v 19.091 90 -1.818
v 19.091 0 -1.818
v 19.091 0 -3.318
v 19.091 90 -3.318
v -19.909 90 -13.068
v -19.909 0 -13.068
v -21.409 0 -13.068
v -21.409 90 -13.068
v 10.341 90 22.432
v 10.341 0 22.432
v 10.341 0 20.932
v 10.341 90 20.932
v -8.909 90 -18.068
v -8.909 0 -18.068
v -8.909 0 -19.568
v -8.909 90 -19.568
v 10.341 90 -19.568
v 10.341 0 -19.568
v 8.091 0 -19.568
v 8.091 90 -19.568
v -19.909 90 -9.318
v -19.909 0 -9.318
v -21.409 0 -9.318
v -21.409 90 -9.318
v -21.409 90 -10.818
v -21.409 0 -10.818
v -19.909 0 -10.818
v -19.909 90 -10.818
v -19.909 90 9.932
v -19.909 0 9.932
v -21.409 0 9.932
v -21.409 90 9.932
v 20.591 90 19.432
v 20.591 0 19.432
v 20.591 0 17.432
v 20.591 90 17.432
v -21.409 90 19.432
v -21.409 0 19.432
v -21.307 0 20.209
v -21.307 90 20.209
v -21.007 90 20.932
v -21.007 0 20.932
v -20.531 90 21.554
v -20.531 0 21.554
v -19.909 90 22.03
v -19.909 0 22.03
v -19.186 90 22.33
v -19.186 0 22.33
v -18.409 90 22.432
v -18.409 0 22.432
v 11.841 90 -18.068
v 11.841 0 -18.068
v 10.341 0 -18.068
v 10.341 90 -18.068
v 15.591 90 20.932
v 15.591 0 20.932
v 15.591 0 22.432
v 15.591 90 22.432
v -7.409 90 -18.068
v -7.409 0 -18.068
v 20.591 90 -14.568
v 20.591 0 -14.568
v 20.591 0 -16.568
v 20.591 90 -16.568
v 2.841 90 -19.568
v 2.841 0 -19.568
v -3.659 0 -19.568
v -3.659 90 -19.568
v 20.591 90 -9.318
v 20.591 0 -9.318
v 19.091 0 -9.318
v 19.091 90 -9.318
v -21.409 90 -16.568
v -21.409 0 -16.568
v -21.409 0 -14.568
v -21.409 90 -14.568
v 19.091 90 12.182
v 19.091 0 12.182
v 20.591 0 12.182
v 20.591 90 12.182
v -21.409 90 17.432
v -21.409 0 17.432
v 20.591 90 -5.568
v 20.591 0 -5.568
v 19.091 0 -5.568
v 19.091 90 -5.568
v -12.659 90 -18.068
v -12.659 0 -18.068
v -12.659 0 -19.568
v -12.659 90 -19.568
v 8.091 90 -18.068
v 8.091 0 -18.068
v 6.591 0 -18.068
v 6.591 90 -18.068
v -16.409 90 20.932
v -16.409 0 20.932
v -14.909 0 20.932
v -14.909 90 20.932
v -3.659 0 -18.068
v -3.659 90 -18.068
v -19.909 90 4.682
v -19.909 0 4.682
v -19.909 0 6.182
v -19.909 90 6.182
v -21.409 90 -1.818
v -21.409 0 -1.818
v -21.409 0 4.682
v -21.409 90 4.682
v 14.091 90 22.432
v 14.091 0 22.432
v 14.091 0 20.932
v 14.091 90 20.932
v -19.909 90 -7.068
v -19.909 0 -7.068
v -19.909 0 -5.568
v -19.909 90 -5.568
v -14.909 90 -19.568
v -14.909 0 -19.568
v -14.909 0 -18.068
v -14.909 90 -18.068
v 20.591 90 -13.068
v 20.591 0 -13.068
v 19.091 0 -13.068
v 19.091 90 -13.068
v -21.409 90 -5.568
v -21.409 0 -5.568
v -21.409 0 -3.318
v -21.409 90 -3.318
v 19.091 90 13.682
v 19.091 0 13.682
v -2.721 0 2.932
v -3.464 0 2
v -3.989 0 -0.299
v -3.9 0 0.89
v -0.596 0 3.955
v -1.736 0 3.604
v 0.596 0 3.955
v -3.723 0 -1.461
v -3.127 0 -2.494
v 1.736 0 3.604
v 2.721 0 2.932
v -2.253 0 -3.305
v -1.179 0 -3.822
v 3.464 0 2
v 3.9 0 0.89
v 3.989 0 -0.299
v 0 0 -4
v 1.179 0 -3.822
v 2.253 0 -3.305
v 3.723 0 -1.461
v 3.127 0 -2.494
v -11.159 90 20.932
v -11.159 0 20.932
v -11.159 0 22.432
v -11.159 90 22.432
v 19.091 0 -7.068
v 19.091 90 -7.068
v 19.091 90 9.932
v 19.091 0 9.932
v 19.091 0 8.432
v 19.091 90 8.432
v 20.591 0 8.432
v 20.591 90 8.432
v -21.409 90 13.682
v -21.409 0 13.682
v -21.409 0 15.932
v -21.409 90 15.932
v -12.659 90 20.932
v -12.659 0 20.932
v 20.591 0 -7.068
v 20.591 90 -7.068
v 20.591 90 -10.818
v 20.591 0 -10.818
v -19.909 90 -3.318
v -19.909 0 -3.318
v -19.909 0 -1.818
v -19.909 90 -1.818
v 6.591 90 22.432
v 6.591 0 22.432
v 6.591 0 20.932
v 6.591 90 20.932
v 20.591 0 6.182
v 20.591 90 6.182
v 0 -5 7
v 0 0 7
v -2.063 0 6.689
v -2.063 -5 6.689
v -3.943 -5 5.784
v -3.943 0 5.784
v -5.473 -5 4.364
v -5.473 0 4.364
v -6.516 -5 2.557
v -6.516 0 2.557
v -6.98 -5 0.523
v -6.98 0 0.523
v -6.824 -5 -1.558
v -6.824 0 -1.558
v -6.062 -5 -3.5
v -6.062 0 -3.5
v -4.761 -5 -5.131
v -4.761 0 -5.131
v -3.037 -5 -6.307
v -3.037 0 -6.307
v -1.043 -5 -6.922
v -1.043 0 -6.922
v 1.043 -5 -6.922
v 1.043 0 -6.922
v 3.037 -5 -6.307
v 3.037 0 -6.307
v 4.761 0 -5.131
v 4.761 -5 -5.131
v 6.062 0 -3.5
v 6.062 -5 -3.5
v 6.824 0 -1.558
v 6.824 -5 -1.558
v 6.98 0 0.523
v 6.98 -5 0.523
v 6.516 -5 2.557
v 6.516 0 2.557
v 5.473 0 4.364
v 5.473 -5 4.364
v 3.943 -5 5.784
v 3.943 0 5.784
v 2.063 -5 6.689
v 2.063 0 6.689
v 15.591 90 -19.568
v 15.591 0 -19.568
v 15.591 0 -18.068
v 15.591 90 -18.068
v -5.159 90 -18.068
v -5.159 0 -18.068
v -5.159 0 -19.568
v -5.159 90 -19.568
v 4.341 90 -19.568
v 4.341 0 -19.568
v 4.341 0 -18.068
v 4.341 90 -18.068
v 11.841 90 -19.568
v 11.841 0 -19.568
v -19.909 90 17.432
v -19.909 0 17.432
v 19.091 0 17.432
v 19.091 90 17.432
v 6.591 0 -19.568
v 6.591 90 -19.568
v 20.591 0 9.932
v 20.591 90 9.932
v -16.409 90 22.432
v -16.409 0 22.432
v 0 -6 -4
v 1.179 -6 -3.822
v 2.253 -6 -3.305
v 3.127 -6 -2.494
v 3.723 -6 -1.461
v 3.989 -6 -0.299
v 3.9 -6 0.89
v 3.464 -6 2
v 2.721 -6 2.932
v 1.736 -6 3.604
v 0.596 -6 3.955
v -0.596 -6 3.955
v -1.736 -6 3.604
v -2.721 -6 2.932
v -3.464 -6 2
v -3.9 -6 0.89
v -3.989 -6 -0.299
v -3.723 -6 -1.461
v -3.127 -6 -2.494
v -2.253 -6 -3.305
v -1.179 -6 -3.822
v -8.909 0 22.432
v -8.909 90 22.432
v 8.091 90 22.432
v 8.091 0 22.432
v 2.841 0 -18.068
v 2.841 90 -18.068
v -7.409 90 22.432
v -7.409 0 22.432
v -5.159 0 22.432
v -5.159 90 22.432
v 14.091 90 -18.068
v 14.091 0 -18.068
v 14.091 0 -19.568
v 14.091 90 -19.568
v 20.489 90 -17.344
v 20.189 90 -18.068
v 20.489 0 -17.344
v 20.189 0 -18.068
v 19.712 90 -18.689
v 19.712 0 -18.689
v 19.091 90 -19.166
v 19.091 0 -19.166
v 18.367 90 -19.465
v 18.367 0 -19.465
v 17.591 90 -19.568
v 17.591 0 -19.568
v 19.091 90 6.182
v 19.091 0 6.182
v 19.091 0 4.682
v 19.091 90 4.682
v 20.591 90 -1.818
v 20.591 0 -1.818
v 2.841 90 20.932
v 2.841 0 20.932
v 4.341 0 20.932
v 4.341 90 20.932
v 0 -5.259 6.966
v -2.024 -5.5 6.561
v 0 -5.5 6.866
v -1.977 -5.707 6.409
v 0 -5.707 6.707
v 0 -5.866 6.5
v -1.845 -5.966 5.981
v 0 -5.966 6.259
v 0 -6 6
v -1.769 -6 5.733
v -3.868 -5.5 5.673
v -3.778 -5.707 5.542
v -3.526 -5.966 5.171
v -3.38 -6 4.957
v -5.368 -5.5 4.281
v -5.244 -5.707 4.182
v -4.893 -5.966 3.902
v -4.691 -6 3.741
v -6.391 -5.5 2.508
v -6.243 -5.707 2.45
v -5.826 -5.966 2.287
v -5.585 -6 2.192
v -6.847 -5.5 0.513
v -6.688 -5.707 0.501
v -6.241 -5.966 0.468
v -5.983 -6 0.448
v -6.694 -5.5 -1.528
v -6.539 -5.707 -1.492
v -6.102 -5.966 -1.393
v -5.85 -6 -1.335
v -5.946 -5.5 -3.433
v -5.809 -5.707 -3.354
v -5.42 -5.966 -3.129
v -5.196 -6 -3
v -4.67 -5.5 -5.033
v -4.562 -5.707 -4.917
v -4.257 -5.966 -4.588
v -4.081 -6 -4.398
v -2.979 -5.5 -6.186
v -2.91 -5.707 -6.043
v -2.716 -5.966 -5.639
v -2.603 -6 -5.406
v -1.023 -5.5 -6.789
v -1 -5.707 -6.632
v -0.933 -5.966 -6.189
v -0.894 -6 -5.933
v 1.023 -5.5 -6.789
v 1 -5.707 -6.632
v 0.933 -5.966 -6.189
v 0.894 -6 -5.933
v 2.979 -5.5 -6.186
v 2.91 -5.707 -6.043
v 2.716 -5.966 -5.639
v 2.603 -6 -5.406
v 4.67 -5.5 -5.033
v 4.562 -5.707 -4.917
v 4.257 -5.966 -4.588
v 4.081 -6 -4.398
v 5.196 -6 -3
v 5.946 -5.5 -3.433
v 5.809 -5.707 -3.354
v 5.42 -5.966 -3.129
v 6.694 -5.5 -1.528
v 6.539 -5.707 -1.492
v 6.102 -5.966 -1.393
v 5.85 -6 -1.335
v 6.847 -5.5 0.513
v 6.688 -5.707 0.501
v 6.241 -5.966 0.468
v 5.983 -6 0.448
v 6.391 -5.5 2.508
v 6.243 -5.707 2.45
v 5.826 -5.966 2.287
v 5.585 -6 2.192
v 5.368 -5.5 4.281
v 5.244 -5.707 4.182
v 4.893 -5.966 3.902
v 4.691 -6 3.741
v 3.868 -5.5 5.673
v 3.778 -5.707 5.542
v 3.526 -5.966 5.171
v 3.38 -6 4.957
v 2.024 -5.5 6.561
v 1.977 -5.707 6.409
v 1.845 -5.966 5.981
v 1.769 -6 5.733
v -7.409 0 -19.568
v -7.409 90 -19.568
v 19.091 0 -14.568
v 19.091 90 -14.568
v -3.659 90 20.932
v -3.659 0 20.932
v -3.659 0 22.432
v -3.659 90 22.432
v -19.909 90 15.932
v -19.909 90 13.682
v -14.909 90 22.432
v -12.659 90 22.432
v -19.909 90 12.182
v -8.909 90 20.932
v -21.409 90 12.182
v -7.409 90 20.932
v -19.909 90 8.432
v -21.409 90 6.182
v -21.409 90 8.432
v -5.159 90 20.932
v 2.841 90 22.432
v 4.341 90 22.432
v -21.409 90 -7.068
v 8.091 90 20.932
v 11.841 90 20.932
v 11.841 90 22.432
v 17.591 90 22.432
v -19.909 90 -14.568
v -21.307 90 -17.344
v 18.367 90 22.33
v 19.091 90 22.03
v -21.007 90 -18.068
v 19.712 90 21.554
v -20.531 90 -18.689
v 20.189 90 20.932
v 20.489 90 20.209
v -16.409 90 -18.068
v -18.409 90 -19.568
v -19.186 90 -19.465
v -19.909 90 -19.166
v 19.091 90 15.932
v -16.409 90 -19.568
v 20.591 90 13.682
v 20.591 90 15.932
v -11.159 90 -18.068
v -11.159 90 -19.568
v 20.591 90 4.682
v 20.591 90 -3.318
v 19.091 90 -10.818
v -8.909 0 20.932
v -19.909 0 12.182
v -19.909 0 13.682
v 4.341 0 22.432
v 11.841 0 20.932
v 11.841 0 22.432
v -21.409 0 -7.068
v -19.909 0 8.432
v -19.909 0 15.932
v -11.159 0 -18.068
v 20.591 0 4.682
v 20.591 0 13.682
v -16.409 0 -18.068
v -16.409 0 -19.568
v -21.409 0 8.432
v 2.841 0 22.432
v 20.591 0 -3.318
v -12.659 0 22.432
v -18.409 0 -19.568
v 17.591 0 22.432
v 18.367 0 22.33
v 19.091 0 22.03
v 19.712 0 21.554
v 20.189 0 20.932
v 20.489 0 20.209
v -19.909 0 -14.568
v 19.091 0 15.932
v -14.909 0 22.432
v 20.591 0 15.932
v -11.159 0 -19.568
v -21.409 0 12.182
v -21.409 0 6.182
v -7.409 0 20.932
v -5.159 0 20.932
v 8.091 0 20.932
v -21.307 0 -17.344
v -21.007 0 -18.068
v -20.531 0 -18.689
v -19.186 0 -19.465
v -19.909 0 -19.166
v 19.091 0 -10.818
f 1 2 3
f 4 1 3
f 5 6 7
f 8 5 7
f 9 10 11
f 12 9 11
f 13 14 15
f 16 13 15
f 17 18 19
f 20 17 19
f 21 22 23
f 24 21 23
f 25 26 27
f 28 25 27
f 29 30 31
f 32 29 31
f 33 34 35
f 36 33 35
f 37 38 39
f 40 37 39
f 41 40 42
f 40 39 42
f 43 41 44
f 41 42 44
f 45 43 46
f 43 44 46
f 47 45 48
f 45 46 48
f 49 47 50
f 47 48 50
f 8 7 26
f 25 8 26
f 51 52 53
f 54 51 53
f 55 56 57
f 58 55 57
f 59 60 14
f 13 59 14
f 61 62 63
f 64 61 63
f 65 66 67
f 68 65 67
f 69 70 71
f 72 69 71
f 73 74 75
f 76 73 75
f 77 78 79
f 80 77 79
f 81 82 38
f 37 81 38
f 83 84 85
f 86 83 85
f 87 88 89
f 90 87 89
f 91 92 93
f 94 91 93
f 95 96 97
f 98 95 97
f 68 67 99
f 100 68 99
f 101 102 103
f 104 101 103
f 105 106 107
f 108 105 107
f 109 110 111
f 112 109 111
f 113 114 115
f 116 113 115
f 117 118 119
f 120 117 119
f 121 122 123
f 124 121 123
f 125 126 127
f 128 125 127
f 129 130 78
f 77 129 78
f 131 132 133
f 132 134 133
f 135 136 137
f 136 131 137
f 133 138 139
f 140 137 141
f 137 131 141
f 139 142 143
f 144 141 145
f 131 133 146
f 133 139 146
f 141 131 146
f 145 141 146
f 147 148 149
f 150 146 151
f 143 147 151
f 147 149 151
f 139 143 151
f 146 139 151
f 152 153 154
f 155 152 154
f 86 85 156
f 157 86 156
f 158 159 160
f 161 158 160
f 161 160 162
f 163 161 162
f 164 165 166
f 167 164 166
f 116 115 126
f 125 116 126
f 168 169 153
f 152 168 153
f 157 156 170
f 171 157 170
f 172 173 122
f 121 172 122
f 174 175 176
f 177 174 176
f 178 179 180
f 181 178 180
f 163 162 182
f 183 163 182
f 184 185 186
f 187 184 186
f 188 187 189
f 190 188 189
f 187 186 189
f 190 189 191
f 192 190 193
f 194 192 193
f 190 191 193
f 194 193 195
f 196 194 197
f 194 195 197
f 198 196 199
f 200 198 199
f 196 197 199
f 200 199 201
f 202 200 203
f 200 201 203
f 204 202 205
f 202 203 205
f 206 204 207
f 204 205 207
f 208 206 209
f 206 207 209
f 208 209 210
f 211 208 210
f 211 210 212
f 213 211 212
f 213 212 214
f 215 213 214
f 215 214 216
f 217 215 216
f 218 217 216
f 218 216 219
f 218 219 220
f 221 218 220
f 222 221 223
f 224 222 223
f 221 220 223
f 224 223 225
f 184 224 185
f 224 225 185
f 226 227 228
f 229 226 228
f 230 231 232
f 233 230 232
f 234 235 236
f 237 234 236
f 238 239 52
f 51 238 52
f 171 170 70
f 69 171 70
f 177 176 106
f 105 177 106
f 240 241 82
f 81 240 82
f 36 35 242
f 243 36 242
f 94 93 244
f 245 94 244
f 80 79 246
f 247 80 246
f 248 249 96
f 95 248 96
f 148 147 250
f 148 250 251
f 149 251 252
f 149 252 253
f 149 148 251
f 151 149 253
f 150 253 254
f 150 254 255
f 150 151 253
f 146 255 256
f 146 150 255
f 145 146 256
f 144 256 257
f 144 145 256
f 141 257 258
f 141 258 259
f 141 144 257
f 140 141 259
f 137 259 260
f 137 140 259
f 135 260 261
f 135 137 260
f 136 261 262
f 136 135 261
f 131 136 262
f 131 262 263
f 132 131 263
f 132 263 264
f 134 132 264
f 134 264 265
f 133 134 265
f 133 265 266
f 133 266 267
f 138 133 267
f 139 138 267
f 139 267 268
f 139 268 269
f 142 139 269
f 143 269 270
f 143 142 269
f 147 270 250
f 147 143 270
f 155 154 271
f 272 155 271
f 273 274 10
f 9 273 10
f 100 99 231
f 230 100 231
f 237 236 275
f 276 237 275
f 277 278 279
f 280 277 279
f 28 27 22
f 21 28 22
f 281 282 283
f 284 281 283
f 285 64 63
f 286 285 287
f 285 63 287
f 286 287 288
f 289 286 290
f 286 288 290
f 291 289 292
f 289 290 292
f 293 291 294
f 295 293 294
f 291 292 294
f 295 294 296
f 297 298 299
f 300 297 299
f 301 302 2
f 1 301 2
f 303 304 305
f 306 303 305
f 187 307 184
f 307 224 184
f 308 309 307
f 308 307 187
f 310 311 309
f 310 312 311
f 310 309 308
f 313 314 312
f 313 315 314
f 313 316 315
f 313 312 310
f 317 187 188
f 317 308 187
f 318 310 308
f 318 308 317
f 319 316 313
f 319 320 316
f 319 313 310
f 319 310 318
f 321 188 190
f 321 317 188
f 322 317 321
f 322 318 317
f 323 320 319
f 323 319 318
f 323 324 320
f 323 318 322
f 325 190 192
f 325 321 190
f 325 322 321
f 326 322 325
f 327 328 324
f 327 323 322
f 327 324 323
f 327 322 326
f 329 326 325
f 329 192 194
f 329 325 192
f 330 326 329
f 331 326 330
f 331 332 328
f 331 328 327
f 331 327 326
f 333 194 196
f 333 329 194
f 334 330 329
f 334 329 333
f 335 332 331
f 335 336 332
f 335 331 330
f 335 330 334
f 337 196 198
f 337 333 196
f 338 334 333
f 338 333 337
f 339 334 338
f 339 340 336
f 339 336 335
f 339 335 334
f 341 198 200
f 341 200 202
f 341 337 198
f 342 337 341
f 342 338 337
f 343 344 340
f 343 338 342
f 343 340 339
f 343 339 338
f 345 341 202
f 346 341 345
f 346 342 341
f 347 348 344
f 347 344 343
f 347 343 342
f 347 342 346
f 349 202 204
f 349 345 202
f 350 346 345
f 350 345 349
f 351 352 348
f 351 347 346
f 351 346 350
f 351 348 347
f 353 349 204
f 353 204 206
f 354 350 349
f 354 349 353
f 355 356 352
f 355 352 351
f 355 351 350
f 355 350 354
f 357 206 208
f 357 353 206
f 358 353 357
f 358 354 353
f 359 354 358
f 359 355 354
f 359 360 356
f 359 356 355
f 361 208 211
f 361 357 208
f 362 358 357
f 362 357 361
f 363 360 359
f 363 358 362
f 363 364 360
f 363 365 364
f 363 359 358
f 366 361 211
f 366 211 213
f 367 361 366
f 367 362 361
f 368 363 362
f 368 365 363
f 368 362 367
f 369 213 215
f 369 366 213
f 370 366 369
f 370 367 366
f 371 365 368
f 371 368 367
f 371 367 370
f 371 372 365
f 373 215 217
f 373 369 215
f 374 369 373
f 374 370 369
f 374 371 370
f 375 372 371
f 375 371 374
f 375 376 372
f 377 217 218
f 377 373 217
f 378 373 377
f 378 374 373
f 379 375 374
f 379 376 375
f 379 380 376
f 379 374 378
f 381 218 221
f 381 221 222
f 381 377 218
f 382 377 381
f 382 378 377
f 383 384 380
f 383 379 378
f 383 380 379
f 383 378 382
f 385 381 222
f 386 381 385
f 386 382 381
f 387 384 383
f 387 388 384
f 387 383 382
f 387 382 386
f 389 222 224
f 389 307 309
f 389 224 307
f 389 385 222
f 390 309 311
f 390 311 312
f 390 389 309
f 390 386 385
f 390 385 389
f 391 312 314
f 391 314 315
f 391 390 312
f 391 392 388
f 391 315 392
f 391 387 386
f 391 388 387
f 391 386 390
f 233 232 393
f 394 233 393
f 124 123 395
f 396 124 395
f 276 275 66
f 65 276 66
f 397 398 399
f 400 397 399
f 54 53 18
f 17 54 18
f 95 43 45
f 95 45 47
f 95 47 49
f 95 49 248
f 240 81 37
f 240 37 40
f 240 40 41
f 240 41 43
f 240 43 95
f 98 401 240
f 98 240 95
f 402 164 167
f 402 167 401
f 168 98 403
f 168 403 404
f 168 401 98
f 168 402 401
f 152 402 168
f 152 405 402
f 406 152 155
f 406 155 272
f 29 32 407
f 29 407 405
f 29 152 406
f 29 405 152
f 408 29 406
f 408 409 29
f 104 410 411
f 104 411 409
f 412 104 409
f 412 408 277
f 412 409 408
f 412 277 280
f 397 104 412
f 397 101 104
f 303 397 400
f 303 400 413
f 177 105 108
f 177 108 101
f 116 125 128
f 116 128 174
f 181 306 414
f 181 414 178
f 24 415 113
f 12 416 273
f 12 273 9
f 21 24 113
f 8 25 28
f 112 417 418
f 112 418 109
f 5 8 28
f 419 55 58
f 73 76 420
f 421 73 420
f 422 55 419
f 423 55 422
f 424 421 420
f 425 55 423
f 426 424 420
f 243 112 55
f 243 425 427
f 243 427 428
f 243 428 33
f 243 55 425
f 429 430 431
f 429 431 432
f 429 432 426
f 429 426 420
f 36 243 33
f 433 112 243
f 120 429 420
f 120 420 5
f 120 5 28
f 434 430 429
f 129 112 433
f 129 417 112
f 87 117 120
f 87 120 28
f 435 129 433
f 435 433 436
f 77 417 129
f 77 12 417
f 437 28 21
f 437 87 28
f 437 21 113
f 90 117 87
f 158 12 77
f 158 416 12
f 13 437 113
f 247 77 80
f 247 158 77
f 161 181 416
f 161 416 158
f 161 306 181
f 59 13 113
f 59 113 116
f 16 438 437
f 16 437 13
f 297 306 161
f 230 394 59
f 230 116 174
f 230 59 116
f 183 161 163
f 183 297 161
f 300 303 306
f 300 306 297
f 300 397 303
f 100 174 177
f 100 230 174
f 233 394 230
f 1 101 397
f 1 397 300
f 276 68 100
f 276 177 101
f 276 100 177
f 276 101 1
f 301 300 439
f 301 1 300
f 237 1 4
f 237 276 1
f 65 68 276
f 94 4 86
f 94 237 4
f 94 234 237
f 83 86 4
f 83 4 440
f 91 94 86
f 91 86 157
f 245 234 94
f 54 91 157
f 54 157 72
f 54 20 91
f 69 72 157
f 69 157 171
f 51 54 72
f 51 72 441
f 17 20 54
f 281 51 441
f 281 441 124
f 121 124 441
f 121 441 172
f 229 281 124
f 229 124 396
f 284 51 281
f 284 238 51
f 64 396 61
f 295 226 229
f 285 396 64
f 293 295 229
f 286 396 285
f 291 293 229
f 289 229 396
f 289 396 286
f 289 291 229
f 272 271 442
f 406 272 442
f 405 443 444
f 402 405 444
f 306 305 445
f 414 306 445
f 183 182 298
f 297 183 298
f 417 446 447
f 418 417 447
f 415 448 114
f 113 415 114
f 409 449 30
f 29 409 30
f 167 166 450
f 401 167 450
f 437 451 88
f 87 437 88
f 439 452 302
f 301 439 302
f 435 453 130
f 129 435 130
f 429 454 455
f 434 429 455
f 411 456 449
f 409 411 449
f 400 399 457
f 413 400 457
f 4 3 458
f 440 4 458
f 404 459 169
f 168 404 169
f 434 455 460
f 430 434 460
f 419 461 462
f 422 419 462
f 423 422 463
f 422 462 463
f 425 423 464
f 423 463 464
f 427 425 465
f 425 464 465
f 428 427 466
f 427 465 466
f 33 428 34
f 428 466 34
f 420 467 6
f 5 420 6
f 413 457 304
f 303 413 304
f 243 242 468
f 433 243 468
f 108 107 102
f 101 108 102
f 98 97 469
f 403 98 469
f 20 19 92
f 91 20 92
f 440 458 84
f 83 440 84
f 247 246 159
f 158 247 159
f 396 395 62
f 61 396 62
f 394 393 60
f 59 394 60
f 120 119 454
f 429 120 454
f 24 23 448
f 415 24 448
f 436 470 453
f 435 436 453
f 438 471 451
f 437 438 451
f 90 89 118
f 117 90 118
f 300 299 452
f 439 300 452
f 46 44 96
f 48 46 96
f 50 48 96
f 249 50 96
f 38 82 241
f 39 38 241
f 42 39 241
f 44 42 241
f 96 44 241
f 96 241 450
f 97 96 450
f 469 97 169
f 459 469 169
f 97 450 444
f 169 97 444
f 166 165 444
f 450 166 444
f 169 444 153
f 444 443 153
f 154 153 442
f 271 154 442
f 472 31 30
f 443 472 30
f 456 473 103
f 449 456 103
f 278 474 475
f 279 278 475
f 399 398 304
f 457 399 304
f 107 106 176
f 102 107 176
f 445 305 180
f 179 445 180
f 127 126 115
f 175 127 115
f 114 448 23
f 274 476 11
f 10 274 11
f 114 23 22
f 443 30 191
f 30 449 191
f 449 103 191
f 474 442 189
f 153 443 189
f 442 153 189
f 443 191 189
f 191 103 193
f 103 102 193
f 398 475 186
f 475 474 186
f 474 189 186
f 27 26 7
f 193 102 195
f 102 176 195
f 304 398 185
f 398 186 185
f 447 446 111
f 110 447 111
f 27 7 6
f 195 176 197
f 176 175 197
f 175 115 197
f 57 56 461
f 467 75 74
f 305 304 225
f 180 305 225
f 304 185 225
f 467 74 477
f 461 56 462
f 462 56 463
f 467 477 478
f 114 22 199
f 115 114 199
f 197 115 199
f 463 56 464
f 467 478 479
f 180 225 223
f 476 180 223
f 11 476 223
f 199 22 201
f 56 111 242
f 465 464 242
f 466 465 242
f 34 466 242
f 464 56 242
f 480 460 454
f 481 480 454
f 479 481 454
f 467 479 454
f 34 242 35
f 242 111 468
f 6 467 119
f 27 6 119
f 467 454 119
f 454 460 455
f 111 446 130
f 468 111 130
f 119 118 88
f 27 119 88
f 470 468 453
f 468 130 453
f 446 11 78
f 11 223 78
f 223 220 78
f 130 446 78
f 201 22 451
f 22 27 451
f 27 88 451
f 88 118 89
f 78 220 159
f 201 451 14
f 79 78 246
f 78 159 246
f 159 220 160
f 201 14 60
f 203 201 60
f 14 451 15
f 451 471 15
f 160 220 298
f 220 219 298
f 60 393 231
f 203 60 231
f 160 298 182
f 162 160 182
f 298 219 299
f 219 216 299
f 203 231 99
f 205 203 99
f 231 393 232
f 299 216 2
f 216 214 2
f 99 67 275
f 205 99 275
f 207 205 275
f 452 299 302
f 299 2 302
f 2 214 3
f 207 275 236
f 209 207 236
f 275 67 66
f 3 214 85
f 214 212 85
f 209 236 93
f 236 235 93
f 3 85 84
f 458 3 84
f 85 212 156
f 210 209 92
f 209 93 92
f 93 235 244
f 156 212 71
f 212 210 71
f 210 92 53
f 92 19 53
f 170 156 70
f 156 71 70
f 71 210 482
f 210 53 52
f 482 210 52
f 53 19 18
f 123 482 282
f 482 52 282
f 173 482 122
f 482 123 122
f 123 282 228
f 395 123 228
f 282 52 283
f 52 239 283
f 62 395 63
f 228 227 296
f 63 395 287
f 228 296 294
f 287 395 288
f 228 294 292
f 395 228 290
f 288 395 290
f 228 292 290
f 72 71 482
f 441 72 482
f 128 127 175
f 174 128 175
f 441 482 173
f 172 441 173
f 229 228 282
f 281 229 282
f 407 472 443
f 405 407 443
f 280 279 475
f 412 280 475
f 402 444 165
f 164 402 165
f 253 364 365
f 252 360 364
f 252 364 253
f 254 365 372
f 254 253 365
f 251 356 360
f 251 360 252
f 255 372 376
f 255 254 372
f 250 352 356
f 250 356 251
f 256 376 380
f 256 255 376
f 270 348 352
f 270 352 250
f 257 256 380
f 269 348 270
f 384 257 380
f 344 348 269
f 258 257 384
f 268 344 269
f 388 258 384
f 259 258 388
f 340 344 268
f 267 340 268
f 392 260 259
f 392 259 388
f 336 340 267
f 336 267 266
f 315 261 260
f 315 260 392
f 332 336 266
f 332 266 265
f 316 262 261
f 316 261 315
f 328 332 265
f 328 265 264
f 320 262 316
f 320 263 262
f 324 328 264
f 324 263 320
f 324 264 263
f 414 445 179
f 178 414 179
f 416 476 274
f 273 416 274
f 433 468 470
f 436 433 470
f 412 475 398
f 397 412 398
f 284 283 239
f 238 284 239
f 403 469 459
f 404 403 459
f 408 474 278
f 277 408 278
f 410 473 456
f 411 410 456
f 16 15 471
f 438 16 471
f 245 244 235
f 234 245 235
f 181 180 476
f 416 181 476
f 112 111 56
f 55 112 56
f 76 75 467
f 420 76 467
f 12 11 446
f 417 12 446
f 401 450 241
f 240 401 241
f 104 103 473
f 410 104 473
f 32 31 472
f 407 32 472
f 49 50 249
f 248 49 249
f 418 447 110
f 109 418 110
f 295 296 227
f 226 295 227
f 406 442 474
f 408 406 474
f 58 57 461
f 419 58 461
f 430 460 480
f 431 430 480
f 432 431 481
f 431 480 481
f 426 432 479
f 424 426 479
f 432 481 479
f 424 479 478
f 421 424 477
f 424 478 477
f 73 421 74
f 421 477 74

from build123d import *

# Parameters (mm, degrees)
BOSS_EXTRU_1_DEPTH = 90
ESQUISSE2_R        = 7
ESQUISSE2_R_2      = 4
BOSS_EXTRU_2_DEPTH = 6
CONG_1_R           = 1


with BuildPart() as part:
    # Esquisse1 → Boss.-Extru.1 (new body)
    with BuildSketch(Plane(origin=(0, 0, 0), x_dir=(1, 0, 0), z_dir=(0, 1, 0))):
        with BuildLine():
            Line((-19.909227763, -17.432297172), (-21.409227763, -17.432297172))
            Line((-21.409227763, -17.432297172), (-21.409227763, -19.432297172))
            ThreePointArc((-21.409227763, -19.432297172), (-20.530548107, -21.553617516), (-18.409227763, -22.432297172))
            Line((-18.409227763, -22.432297172), (-16.409227763, -22.432297172))
            Line((-16.409227763, -22.432297172), (-16.409227763, -20.932297172))
            Line((-16.409227763, -20.932297172), (-14.909227763, -20.932297172))
            Line((-14.909227763, -20.932297172), (-14.909227763, -22.432297172))
            Line((-14.909227763, -22.432297172), (-12.659227763, -22.432297172))
            Line((-12.659227763, -22.432297172), (-12.659227763, -20.932297172))
            Line((-12.659227763, -20.932297172), (-11.159227763, -20.932297172))
            Line((-11.159227763, -20.932297172), (-11.159227763, -22.432297172))
            Line((-11.159227763, -22.432297172), (-8.909227763, -22.432297172))
            Line((-8.909227763, -22.432297172), (-8.909227763, -20.932297172))
            Line((-8.909227763, -20.932297172), (-7.409227763, -20.932297172))
            Line((-7.409227763, -20.932297172), (-7.409227763, -22.432297172))
            Line((-7.409227763, -22.432297172), (-5.159227763, -22.432297172))
            Line((-5.159227763, -22.432297172), (-5.159227763, -20.932297172))
            Line((-5.159227763, -20.932297172), (-3.659227763, -20.932297172))
            Line((-3.659227763, -20.932297172), (-3.659227763, -22.432297172))
            Line((-3.659227763, -22.432297172), (2.840772237, -22.432297172))
            Line((2.840772237, -22.432297172), (2.840772237, -20.932297172))
            Line((2.840772237, -20.932297172), (4.340772237, -20.932297172))
            Line((4.340772237, -20.932297172), (4.340772237, -22.432297172))
            Line((4.340772237, -22.432297172), (6.590772237, -22.432297172))
            Line((6.590772237, -22.432297172), (6.590772237, -20.932297172))
            Line((6.590772237, -20.932297172), (8.090772237, -20.932297172))
            Line((8.090772237, -20.932297172), (8.090772237, -22.432297172))
            Line((8.090772237, -22.432297172), (10.340772237, -22.432297172))
            Line((10.340772237, -22.432297172), (10.340772237, -20.932297172))
            Line((10.340772237, -20.932297172), (11.840772237, -20.932297172))
            Line((11.840772237, -20.932297172), (11.840772237, -22.432297172))
            Line((11.840772237, -22.432297172), (14.090772237, -22.432297172))
            Line((14.090772237, -22.432297172), (14.090772237, -20.932297172))
            Line((14.090772237, -20.932297172), (15.590772237, -20.932297172))
            Line((15.590772237, -20.932297172), (15.590772237, -22.432297172))
            Line((15.590772237, -22.432297172), (17.590772237, -22.432297172))
            ThreePointArc((17.590772237, -22.432297172), (19.71209258, -21.553617516), (20.590772237, -19.432297172))
            Line((20.590772237, -19.432297172), (20.590772237, -17.432297172))
            Line((20.590772237, -17.432297172), (19.090772237, -17.432297172))
            Line((19.090772237, -17.432297172), (19.090772237, -15.932297172))
            Line((19.090772237, -15.932297172), (20.590772237, -15.932297172))
            Line((20.590772237, -15.932297172), (20.590772237, -13.682297172))
            Line((20.590772237, -13.682297172), (19.090772237, -13.682297172))
            Line((19.090772237, -13.682297172), (19.090772237, -12.182297172))
            Line((19.090772237, -12.182297172), (20.590772237, -12.182297172))
            Line((20.590772237, -12.182297172), (20.590772237, -9.932297172))
            Line((20.590772237, -9.932297172), (19.090772237, -9.932297172))
            Line((19.090772237, -9.932297172), (19.090772237, -8.432297172))
            Line((19.090772237, -8.432297172), (20.590772237, -8.432297172))
            Line((20.590772237, -8.432297172), (20.590772237, -6.182297172))
            Line((20.590772237, -6.182297172), (19.090772237, -6.182297172))
            Line((19.090772237, -6.182297172), (19.090772237, -4.682297172))
            Line((19.090772237, -4.682297172), (20.590772237, -4.682297172))
            Line((20.590772237, -4.682297172), (20.590772237, 1.817702828))
            Line((20.590772237, 1.817702828), (19.090772237, 1.817702828))
            Line((19.090772237, 1.817702828), (19.090772237, 3.317702828))
            Line((19.090772237, 3.317702828), (20.590772237, 3.317702828))
            Line((20.590772237, 3.317702828), (20.590772237, 5.567702828))
            Line((20.590772237, 5.567702828), (19.090772237, 5.567702828))
            Line((19.090772237, 5.567702828), (19.090772237, 7.067702828))
            Line((19.090772237, 7.067702828), (20.590772237, 7.067702828))
            Line((20.590772237, 7.067702828), (20.590772237, 9.317702828))
            Line((20.590772237, 9.317702828), (19.090772237, 9.317702828))
            Line((19.090772237, 9.317702828), (19.090772237, 10.817702828))
            Line((19.090772237, 10.817702828), (20.590772237, 10.817702828))
            Line((20.590772237, 10.817702828), (20.590772237, 13.067702828))
            Line((20.590772237, 13.067702828), (19.090772237, 13.067702828))
            Line((19.090772237, 13.067702828), (19.090772237, 14.567702828))
            Line((19.090772237, 14.567702828), (20.590772237, 14.567702828))
            Line((20.590772237, 14.567702828), (20.590772237, 16.567702828))
            ThreePointArc((20.590772237, 16.567702828), (19.71209258, 18.689023171), (17.590772237, 19.567702828))
            Line((17.590772237, 19.567702828), (15.590772237, 19.567702828))
            Line((15.590772237, 19.567702828), (15.590772237, 18.067702828))
            Line((15.590772237, 18.067702828), (14.090772237, 18.067702828))
            Line((14.090772237, 18.067702828), (14.090772237, 19.567702828))
            Line((14.090772237, 19.567702828), (11.840772237, 19.567702828))
            Line((11.840772237, 19.567702828), (11.840772237, 18.067702828))
            Line((11.840772237, 18.067702828), (10.340772237, 18.067702828))
            Line((10.340772237, 18.067702828), (10.340772237, 19.567702828))
            Line((10.340772237, 19.567702828), (8.090772237, 19.567702828))
            Line((8.090772237, 19.567702828), (8.090772237, 18.067702828))
            Line((8.090772237, 18.067702828), (6.590772237, 18.067702828))
            Line((6.590772237, 18.067702828), (6.590772237, 19.567702828))
            Line((6.590772237, 19.567702828), (4.340772237, 19.567702828))
            Line((4.340772237, 19.567702828), (4.340772237, 18.067702828))
            Line((4.340772237, 18.067702828), (2.840772237, 18.067702828))
            Line((2.840772237, 18.067702828), (2.840772237, 19.567702828))
            Line((2.840772237, 19.567702828), (-3.659227763, 19.567702828))
            Line((-3.659227763, 19.567702828), (-3.659227763, 18.067702828))
            Line((-3.659227763, 18.067702828), (-5.159227763, 18.067702828))
            Line((-5.159227763, 18.067702828), (-5.159227763, 19.567702828))
            Line((-5.159227763, 19.567702828), (-7.409227763, 19.567702828))
            Line((-7.409227763, 19.567702828), (-7.409227763, 18.067702828))
            Line((-7.409227763, 18.067702828), (-8.909227763, 18.067702828))
            Line((-8.909227763, 18.067702828), (-8.909227763, 19.567702828))
            Line((-8.909227763, 19.567702828), (-11.159227763, 19.567702828))
            Line((-11.159227763, 19.567702828), (-11.159227763, 18.067702828))
            Line((-11.159227763, 18.067702828), (-12.659227763, 18.067702828))
            Line((-12.659227763, 18.067702828), (-12.659227763, 19.567702828))
            Line((-12.659227763, 19.567702828), (-14.909227763, 19.567702828))
            Line((-14.909227763, 19.567702828), (-14.909227763, 18.067702828))
            Line((-14.909227763, 18.067702828), (-16.409227763, 18.067702828))
            Line((-16.409227763, 18.067702828), (-16.409227763, 19.567702828))
            Line((-16.409227763, 19.567702828), (-18.409227763, 19.567702828))
            ThreePointArc((-18.409227763, 19.567702828), (-20.530548107, 18.689023171), (-21.409227763, 16.567702828))
            Line((-21.409227763, 16.567702828), (-21.409227763, 14.567702828))
            Line((-21.409227763, 14.567702828), (-19.909227763, 14.567702828))
            Line((-19.909227763, 14.567702828), (-19.909227763, 13.067702828))
            Line((-19.909227763, 13.067702828), (-21.409227763, 13.067702828))
            Line((-21.409227763, 13.067702828), (-21.409227763, 10.817702828))
            Line((-21.409227763, 10.817702828), (-19.909227763, 10.817702828))
            Line((-19.909227763, 10.817702828), (-19.909227763, 9.317702828))
            Line((-19.909227763, 9.317702828), (-21.409227763, 9.317702828))
            Line((-21.409227763, 9.317702828), (-21.409227763, 7.067702828))
            Line((-21.409227763, 7.067702828), (-19.909227763, 7.067702828))
            Line((-19.909227763, 7.067702828), (-19.909227763, 5.567702828))
            Line((-19.909227763, 5.567702828), (-21.409227763, 5.567702828))
            Line((-21.409227763, 5.567702828), (-21.409227763, 3.317702828))
            Line((-21.409227763, 3.317702828), (-19.909227763, 3.317702828))
            Line((-19.909227763, 3.317702828), (-19.909227763, 1.817702828))
            Line((-19.909227763, 1.817702828), (-21.409227763, 1.817702828))
            Line((-21.409227763, 1.817702828), (-21.409227763, -4.682297172))
            Line((-21.409227763, -4.682297172), (-19.909227763, -4.682297172))
            Line((-19.909227763, -4.682297172), (-19.909227763, -6.182297172))
            Line((-19.909227763, -6.182297172), (-21.409227763, -6.182297172))
            Line((-21.409227763, -6.182297172), (-21.409227763, -8.432297172))
            Line((-21.409227763, -8.432297172), (-19.909227763, -8.432297172))
            Line((-19.909227763, -8.432297172), (-19.909227763, -9.932297172))
            Line((-19.909227763, -9.932297172), (-21.409227763, -9.932297172))
            Line((-21.409227763, -9.932297172), (-21.409227763, -12.182297172))
            Line((-21.409227763, -12.182297172), (-19.909227763, -12.182297172))
            Line((-19.909227763, -12.182297172), (-19.909227763, -13.682297172))
            Line((-19.909227763, -13.682297172), (-21.409227763, -13.682297172))
            Line((-21.409227763, -13.682297172), (-21.409227763, -15.932297172))
            Line((-21.409227763, -15.932297172), (-19.909227763, -15.932297172))
            Line((-19.909227763, -15.932297172), (-19.909227763, -17.432297172))
        make_face()
    extrude(amount=BOSS_EXTRU_1_DEPTH)

    # Esquisse2 → Boss.-Extru.2 (add)
    with BuildSketch(Plane.XZ):
        with Locations(Location((0, 0, 0), (0, 0, 90))):
            Circle(ESQUISSE2_R)
        with Locations(Location((0, 0, 0), (0, 0, 270))):
            Circle(ESQUISSE2_R_2, mode=Mode.SUBTRACT)
    extrude(amount=BOSS_EXTRU_2_DEPTH)

    # Congé1
    cong_1_edges = [part.edges().sort_by_distance(p)[0] for p in [
        (0, -6, -7),
    ]]
    fillet(cong_1_edges, radius=CONG_1_R)


solid = part.part
